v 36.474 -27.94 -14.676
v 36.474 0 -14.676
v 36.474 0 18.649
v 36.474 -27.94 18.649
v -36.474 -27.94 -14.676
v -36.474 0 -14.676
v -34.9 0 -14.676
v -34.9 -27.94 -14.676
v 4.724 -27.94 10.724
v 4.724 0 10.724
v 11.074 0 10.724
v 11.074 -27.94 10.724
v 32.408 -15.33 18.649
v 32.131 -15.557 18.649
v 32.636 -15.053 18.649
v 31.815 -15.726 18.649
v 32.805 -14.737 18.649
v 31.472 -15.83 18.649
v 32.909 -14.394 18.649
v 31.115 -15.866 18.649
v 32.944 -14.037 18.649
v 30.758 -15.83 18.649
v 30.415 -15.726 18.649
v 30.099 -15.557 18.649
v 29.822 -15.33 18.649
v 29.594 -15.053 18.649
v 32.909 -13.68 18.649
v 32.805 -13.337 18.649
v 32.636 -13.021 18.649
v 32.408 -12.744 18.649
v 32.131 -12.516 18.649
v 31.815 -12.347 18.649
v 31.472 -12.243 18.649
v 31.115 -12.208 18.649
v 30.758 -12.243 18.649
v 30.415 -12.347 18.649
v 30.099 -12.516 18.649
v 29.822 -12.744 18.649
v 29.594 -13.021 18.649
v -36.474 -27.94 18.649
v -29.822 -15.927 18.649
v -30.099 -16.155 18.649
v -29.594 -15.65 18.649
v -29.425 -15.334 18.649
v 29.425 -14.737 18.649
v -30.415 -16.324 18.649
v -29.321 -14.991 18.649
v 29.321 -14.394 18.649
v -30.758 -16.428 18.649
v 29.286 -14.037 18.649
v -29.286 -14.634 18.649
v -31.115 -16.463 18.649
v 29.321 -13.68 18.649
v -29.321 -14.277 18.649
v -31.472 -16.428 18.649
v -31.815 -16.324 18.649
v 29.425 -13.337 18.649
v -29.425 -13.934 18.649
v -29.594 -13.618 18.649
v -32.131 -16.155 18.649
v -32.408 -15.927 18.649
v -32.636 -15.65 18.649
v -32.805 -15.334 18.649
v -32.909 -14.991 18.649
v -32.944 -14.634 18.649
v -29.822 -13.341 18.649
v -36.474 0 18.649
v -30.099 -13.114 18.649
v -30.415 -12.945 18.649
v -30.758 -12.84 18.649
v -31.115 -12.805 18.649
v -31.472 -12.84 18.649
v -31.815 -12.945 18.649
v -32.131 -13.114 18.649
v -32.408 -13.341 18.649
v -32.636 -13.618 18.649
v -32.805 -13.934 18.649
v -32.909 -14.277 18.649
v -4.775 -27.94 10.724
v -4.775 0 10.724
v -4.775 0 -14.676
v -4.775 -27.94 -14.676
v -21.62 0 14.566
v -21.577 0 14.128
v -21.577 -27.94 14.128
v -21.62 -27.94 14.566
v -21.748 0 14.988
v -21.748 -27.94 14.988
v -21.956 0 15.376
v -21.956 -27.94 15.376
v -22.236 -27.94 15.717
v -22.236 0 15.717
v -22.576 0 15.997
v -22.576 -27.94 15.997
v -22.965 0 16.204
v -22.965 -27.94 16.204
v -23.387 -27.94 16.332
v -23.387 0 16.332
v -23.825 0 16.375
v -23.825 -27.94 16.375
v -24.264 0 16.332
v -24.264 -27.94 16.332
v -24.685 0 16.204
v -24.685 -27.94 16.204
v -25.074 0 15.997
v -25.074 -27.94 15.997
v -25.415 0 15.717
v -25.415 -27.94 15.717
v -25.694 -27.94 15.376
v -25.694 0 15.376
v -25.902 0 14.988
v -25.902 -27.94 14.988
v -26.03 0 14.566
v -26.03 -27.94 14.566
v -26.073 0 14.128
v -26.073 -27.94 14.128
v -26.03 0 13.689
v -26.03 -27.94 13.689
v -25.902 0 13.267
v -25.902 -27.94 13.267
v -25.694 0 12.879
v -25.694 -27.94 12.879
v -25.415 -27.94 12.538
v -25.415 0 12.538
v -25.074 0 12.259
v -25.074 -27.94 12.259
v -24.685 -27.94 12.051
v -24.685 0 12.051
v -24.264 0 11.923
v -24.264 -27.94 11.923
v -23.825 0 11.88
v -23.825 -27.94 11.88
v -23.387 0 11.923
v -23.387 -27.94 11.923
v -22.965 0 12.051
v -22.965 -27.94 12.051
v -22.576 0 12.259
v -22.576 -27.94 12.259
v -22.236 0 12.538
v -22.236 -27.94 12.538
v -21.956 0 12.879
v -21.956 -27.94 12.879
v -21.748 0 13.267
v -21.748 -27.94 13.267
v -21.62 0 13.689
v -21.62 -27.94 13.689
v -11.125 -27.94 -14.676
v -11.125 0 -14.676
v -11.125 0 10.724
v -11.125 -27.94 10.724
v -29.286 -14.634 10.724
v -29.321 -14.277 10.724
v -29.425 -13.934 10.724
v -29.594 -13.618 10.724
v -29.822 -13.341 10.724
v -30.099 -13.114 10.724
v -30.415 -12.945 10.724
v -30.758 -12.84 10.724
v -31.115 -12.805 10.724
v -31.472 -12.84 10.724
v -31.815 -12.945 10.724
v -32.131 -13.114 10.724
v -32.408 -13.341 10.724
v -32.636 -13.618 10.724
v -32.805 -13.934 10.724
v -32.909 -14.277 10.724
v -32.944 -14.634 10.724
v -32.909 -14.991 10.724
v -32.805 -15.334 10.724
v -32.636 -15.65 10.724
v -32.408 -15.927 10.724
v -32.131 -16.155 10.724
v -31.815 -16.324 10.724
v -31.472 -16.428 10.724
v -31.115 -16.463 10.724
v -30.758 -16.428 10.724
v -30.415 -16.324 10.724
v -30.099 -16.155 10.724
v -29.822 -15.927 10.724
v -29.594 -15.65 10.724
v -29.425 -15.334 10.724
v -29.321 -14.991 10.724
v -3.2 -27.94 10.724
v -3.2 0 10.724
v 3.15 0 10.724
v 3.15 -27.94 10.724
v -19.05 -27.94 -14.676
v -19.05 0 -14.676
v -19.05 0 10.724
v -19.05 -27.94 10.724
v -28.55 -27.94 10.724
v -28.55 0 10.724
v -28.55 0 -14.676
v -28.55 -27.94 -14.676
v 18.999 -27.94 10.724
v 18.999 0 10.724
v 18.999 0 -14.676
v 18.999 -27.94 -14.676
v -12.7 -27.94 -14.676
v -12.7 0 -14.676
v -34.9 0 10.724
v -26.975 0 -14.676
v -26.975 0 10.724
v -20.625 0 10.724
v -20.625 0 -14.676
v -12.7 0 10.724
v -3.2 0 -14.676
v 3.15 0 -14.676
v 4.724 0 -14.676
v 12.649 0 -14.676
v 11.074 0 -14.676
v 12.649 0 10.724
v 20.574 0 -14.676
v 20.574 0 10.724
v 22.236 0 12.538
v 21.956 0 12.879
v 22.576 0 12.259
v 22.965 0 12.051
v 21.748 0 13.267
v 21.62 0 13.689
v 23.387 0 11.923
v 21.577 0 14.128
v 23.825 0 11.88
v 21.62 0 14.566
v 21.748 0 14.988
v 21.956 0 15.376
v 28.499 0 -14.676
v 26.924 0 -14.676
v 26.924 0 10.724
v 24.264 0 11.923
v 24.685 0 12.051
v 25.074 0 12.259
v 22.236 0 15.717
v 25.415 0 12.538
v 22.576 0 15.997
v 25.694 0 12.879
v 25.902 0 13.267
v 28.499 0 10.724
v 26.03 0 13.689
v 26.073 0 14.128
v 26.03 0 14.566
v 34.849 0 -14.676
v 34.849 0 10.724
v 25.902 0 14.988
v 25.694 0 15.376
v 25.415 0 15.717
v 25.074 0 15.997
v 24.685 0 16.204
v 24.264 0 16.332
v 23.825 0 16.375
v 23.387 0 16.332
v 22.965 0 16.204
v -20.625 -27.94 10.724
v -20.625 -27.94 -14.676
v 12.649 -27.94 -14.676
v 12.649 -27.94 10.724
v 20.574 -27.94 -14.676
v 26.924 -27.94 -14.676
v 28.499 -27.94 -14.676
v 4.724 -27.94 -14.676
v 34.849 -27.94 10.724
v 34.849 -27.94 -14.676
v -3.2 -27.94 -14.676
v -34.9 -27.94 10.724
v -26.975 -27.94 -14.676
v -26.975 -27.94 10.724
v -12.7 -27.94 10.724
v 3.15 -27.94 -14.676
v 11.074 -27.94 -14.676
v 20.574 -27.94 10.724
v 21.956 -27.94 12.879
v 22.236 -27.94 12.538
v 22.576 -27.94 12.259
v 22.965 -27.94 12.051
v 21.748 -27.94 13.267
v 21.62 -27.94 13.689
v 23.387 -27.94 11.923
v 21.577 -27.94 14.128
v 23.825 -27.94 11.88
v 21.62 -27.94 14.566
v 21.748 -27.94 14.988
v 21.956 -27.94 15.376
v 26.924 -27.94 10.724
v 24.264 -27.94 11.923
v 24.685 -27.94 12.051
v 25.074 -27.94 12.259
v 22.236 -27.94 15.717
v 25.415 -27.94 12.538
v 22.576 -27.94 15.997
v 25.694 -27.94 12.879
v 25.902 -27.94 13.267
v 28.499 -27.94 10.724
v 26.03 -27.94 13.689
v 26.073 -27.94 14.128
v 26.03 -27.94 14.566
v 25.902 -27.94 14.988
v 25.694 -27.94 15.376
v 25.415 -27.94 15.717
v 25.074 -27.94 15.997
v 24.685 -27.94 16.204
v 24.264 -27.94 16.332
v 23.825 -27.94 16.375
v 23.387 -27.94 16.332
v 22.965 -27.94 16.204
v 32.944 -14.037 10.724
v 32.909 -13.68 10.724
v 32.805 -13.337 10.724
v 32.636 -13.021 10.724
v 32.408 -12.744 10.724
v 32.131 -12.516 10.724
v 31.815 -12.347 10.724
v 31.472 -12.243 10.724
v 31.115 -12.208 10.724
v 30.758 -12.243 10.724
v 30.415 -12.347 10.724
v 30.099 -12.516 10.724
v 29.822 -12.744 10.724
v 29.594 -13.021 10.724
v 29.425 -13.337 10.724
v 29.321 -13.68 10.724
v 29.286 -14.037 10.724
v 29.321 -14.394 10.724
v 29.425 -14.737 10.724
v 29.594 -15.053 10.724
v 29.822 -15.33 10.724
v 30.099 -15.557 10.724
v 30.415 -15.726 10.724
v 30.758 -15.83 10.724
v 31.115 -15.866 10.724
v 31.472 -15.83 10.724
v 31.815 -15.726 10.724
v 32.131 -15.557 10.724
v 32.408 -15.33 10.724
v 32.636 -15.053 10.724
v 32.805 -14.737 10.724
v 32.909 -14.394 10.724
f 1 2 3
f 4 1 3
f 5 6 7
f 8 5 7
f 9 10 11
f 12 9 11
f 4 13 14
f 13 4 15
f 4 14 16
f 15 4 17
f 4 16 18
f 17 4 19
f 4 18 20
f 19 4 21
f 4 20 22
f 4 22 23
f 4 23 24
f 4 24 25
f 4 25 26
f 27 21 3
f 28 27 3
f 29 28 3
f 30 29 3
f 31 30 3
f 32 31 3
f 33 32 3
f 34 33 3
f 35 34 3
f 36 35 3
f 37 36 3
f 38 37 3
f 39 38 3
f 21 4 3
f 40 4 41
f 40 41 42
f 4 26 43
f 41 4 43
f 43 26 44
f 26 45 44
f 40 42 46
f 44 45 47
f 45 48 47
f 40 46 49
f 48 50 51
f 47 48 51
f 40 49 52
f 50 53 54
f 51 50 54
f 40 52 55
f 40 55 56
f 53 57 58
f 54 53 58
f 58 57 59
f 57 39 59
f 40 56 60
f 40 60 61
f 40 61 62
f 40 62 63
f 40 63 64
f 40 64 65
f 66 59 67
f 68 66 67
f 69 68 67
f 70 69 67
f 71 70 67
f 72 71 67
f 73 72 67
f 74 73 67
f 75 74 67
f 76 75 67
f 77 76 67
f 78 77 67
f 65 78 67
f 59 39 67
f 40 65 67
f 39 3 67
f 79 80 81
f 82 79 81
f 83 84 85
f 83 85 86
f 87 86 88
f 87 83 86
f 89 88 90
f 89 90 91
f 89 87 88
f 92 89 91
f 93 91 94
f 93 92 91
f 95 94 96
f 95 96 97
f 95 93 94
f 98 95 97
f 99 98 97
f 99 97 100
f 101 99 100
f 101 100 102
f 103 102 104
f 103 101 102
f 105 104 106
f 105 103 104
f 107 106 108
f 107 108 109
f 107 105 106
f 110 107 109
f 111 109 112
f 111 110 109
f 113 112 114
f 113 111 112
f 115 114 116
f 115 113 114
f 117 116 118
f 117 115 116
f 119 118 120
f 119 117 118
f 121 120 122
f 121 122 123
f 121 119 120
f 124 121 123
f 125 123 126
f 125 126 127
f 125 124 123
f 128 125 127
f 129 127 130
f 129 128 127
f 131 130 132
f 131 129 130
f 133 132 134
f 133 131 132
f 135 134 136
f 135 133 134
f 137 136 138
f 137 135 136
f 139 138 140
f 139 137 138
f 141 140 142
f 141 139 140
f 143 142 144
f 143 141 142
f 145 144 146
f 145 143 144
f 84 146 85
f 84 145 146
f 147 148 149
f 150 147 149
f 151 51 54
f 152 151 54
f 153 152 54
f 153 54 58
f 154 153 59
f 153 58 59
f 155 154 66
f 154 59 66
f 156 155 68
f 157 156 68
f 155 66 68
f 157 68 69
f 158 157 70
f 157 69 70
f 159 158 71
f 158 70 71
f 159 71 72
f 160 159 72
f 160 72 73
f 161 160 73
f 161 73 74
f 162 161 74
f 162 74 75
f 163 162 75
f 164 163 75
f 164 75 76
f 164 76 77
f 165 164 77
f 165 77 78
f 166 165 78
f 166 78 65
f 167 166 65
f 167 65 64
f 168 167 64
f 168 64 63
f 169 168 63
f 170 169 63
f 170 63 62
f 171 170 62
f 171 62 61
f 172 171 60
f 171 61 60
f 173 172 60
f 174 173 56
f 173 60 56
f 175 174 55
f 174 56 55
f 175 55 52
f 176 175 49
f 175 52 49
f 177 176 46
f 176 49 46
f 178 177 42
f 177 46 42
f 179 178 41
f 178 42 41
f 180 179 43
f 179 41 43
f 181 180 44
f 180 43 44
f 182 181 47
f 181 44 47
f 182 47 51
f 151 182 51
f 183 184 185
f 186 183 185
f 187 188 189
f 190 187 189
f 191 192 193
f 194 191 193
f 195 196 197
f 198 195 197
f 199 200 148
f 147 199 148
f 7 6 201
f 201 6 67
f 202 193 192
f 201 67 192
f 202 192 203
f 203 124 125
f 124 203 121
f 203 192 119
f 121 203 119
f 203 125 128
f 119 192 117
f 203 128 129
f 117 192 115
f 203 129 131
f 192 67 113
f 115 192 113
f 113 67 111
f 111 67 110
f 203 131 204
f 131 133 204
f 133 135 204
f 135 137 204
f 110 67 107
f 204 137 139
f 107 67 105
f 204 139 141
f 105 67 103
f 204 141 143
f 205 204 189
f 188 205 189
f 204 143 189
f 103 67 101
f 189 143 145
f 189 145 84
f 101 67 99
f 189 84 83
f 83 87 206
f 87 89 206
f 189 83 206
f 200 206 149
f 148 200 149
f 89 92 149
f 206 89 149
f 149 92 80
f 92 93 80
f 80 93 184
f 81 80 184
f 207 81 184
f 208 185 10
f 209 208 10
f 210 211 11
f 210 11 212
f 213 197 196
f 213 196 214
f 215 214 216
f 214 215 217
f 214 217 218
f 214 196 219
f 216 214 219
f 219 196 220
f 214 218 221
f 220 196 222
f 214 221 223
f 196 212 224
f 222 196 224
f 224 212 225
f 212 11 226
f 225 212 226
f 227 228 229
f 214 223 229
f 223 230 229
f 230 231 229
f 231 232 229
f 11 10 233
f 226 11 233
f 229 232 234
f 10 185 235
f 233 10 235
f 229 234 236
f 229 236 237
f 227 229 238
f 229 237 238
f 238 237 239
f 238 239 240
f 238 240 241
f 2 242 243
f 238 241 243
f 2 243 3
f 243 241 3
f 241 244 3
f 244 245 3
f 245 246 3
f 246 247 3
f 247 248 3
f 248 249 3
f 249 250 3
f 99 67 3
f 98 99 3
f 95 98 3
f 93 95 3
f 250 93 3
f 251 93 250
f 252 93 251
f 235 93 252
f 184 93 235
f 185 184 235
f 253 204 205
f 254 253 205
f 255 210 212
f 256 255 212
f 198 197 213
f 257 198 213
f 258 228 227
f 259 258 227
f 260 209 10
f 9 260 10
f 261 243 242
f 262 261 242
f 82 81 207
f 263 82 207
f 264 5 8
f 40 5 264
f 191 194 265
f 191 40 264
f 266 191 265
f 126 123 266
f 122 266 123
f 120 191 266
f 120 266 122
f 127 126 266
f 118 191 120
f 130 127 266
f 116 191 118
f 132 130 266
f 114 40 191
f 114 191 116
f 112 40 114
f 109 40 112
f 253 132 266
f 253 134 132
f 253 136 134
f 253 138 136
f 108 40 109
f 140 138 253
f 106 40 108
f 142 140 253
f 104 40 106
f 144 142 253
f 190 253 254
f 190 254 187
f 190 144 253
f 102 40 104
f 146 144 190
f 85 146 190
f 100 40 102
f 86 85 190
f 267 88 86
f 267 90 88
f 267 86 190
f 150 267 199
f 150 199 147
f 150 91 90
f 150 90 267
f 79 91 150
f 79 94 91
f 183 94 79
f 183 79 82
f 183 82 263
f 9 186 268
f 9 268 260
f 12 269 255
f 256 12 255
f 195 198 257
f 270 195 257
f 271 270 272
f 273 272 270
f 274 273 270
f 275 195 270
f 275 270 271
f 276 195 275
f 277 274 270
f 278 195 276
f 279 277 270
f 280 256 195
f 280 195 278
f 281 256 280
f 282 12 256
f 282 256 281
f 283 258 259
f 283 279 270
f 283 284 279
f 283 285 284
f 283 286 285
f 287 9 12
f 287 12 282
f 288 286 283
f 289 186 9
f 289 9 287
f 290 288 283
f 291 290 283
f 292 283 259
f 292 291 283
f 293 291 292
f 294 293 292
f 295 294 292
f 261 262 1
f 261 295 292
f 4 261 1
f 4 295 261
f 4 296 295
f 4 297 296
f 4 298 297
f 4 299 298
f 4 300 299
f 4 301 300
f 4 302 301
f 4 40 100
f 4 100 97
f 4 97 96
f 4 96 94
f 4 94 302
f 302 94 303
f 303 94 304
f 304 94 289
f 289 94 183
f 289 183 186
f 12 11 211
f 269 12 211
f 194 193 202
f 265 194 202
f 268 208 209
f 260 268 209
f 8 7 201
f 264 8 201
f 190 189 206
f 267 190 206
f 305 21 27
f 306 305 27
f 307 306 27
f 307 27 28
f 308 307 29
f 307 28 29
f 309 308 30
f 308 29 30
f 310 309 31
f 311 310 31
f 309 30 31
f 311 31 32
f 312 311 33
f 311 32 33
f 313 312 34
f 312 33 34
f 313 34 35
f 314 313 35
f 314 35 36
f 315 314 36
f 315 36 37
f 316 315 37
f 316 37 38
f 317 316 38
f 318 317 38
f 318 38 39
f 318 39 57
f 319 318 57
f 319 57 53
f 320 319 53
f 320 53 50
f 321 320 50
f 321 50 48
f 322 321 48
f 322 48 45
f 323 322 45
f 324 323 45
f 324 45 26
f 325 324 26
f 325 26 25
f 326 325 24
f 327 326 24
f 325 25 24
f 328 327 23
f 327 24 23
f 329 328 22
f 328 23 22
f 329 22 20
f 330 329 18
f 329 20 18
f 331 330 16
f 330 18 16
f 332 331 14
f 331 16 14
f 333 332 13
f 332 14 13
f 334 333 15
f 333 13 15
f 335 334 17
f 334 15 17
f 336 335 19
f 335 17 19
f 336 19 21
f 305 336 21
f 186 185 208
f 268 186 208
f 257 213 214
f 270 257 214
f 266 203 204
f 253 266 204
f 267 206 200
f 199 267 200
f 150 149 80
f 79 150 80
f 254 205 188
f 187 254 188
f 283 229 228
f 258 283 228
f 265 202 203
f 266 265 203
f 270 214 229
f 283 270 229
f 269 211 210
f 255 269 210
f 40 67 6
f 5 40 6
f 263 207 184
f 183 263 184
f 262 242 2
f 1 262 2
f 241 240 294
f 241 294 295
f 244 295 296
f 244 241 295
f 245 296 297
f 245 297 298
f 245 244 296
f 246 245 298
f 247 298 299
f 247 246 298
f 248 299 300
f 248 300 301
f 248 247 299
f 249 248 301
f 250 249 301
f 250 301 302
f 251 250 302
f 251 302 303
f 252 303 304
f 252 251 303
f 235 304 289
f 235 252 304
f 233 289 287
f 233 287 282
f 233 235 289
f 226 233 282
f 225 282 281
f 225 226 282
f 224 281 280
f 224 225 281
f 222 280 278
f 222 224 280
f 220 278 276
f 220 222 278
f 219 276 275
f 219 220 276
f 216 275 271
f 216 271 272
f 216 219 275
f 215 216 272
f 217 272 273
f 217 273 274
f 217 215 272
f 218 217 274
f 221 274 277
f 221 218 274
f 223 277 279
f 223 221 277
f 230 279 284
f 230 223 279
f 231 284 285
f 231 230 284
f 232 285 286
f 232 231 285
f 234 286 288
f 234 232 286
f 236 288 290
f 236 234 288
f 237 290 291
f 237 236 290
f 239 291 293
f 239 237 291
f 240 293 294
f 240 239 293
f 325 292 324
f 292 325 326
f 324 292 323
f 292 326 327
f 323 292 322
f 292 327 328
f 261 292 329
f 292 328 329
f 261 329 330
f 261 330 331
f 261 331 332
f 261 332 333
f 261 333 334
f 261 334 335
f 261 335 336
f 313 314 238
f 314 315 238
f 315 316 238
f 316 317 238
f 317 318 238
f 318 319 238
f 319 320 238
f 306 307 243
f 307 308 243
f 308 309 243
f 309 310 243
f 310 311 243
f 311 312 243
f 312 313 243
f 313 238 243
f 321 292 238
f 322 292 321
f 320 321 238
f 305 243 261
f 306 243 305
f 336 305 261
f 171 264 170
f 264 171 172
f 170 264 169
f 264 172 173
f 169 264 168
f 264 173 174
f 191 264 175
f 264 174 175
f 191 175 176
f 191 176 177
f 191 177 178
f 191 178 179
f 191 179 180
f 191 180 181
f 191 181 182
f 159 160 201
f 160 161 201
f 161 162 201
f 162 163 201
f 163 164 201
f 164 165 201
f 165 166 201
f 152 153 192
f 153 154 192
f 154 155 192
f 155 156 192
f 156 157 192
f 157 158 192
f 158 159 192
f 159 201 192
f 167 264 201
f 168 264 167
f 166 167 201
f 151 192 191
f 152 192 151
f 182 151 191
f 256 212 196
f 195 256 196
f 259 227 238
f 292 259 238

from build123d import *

# Parameters (mm, degrees)
F0_R     = 2.2479
F1_DEPTH = 27.94
F2_R     = 1.8288
F3_DEPTH = 33.3258
F4_DEPTH = 33.3258


with BuildPart() as f1:
    # F0 (on Front) → F1 (new body)
    with BuildSketch(Plane.XZ):
        Polygon((-36.4744, 18.648794), (-36.4744, -14.676006), (-34.8996, -14.676006), (-34.8996, 10.723994), (-28.5496, 10.723994), (-28.5496, -14.676006), (-26.9748, -14.676006), (-26.9748, 10.723994), (-20.6248, 10.723994), (-20.6248, -14.676006), (-19.05, -14.676006), (-19.05, 10.723994), (-12.7, 10.723994), (-12.7, -14.676006), (-11.1252, -14.676006), (-11.1252, 10.723994), (-4.7752, 10.723994), (-4.7752, -14.676006), (-3.2004, -14.676006), (-3.2004, 10.723994), (3.1496, 10.723994), (3.1496, -14.676006), (4.7244, -14.676006), (4.7244, 10.723994), (11.0744, 10.723994), (11.0744, -14.676006), (12.6492, -14.676006), (12.6492, 10.723994), (18.9992, 10.723994), (18.9992, -14.676006), (20.574, -14.676006), (20.574, 10.723994), (26.924, 10.723994), (26.924, -14.676006), (28.4988, -14.676006), (28.4988, 10.723994), (34.8488, 10.723994), (34.8488, -14.676006), (36.4744, -14.676006), (36.4744, 18.648794), align=None)
        with Locations((-23.8252, 14.127594)):
            Circle(F0_R, mode=Mode.SUBTRACT)
        with Locations((23.8252, 14.127594)):
            Circle(F0_R, mode=Mode.SUBTRACT)
    extrude(amount=F1_DEPTH)

    # F2 (on face) → F3 (cut, through all)
    with BuildSketch(Plane.XY.offset(18.648794)):
        with Locations((-31.115, -14.63412)):
            Circle(F2_R)
    extrude(amount=-F3_DEPTH, mode=Mode.SUBTRACT)

    # F2 (on face) → F4 (cut, through all)
    with BuildSketch(Plane.XY.offset(18.648794)):
        with Locations((31.115, -14.036736)):
            Circle(F2_R)
        with Locations((-31.115, -14.63412)):
            Circle(F2_R)
    extrude(amount=-F4_DEPTH, mode=Mode.SUBTRACT)


solid = f1.part
